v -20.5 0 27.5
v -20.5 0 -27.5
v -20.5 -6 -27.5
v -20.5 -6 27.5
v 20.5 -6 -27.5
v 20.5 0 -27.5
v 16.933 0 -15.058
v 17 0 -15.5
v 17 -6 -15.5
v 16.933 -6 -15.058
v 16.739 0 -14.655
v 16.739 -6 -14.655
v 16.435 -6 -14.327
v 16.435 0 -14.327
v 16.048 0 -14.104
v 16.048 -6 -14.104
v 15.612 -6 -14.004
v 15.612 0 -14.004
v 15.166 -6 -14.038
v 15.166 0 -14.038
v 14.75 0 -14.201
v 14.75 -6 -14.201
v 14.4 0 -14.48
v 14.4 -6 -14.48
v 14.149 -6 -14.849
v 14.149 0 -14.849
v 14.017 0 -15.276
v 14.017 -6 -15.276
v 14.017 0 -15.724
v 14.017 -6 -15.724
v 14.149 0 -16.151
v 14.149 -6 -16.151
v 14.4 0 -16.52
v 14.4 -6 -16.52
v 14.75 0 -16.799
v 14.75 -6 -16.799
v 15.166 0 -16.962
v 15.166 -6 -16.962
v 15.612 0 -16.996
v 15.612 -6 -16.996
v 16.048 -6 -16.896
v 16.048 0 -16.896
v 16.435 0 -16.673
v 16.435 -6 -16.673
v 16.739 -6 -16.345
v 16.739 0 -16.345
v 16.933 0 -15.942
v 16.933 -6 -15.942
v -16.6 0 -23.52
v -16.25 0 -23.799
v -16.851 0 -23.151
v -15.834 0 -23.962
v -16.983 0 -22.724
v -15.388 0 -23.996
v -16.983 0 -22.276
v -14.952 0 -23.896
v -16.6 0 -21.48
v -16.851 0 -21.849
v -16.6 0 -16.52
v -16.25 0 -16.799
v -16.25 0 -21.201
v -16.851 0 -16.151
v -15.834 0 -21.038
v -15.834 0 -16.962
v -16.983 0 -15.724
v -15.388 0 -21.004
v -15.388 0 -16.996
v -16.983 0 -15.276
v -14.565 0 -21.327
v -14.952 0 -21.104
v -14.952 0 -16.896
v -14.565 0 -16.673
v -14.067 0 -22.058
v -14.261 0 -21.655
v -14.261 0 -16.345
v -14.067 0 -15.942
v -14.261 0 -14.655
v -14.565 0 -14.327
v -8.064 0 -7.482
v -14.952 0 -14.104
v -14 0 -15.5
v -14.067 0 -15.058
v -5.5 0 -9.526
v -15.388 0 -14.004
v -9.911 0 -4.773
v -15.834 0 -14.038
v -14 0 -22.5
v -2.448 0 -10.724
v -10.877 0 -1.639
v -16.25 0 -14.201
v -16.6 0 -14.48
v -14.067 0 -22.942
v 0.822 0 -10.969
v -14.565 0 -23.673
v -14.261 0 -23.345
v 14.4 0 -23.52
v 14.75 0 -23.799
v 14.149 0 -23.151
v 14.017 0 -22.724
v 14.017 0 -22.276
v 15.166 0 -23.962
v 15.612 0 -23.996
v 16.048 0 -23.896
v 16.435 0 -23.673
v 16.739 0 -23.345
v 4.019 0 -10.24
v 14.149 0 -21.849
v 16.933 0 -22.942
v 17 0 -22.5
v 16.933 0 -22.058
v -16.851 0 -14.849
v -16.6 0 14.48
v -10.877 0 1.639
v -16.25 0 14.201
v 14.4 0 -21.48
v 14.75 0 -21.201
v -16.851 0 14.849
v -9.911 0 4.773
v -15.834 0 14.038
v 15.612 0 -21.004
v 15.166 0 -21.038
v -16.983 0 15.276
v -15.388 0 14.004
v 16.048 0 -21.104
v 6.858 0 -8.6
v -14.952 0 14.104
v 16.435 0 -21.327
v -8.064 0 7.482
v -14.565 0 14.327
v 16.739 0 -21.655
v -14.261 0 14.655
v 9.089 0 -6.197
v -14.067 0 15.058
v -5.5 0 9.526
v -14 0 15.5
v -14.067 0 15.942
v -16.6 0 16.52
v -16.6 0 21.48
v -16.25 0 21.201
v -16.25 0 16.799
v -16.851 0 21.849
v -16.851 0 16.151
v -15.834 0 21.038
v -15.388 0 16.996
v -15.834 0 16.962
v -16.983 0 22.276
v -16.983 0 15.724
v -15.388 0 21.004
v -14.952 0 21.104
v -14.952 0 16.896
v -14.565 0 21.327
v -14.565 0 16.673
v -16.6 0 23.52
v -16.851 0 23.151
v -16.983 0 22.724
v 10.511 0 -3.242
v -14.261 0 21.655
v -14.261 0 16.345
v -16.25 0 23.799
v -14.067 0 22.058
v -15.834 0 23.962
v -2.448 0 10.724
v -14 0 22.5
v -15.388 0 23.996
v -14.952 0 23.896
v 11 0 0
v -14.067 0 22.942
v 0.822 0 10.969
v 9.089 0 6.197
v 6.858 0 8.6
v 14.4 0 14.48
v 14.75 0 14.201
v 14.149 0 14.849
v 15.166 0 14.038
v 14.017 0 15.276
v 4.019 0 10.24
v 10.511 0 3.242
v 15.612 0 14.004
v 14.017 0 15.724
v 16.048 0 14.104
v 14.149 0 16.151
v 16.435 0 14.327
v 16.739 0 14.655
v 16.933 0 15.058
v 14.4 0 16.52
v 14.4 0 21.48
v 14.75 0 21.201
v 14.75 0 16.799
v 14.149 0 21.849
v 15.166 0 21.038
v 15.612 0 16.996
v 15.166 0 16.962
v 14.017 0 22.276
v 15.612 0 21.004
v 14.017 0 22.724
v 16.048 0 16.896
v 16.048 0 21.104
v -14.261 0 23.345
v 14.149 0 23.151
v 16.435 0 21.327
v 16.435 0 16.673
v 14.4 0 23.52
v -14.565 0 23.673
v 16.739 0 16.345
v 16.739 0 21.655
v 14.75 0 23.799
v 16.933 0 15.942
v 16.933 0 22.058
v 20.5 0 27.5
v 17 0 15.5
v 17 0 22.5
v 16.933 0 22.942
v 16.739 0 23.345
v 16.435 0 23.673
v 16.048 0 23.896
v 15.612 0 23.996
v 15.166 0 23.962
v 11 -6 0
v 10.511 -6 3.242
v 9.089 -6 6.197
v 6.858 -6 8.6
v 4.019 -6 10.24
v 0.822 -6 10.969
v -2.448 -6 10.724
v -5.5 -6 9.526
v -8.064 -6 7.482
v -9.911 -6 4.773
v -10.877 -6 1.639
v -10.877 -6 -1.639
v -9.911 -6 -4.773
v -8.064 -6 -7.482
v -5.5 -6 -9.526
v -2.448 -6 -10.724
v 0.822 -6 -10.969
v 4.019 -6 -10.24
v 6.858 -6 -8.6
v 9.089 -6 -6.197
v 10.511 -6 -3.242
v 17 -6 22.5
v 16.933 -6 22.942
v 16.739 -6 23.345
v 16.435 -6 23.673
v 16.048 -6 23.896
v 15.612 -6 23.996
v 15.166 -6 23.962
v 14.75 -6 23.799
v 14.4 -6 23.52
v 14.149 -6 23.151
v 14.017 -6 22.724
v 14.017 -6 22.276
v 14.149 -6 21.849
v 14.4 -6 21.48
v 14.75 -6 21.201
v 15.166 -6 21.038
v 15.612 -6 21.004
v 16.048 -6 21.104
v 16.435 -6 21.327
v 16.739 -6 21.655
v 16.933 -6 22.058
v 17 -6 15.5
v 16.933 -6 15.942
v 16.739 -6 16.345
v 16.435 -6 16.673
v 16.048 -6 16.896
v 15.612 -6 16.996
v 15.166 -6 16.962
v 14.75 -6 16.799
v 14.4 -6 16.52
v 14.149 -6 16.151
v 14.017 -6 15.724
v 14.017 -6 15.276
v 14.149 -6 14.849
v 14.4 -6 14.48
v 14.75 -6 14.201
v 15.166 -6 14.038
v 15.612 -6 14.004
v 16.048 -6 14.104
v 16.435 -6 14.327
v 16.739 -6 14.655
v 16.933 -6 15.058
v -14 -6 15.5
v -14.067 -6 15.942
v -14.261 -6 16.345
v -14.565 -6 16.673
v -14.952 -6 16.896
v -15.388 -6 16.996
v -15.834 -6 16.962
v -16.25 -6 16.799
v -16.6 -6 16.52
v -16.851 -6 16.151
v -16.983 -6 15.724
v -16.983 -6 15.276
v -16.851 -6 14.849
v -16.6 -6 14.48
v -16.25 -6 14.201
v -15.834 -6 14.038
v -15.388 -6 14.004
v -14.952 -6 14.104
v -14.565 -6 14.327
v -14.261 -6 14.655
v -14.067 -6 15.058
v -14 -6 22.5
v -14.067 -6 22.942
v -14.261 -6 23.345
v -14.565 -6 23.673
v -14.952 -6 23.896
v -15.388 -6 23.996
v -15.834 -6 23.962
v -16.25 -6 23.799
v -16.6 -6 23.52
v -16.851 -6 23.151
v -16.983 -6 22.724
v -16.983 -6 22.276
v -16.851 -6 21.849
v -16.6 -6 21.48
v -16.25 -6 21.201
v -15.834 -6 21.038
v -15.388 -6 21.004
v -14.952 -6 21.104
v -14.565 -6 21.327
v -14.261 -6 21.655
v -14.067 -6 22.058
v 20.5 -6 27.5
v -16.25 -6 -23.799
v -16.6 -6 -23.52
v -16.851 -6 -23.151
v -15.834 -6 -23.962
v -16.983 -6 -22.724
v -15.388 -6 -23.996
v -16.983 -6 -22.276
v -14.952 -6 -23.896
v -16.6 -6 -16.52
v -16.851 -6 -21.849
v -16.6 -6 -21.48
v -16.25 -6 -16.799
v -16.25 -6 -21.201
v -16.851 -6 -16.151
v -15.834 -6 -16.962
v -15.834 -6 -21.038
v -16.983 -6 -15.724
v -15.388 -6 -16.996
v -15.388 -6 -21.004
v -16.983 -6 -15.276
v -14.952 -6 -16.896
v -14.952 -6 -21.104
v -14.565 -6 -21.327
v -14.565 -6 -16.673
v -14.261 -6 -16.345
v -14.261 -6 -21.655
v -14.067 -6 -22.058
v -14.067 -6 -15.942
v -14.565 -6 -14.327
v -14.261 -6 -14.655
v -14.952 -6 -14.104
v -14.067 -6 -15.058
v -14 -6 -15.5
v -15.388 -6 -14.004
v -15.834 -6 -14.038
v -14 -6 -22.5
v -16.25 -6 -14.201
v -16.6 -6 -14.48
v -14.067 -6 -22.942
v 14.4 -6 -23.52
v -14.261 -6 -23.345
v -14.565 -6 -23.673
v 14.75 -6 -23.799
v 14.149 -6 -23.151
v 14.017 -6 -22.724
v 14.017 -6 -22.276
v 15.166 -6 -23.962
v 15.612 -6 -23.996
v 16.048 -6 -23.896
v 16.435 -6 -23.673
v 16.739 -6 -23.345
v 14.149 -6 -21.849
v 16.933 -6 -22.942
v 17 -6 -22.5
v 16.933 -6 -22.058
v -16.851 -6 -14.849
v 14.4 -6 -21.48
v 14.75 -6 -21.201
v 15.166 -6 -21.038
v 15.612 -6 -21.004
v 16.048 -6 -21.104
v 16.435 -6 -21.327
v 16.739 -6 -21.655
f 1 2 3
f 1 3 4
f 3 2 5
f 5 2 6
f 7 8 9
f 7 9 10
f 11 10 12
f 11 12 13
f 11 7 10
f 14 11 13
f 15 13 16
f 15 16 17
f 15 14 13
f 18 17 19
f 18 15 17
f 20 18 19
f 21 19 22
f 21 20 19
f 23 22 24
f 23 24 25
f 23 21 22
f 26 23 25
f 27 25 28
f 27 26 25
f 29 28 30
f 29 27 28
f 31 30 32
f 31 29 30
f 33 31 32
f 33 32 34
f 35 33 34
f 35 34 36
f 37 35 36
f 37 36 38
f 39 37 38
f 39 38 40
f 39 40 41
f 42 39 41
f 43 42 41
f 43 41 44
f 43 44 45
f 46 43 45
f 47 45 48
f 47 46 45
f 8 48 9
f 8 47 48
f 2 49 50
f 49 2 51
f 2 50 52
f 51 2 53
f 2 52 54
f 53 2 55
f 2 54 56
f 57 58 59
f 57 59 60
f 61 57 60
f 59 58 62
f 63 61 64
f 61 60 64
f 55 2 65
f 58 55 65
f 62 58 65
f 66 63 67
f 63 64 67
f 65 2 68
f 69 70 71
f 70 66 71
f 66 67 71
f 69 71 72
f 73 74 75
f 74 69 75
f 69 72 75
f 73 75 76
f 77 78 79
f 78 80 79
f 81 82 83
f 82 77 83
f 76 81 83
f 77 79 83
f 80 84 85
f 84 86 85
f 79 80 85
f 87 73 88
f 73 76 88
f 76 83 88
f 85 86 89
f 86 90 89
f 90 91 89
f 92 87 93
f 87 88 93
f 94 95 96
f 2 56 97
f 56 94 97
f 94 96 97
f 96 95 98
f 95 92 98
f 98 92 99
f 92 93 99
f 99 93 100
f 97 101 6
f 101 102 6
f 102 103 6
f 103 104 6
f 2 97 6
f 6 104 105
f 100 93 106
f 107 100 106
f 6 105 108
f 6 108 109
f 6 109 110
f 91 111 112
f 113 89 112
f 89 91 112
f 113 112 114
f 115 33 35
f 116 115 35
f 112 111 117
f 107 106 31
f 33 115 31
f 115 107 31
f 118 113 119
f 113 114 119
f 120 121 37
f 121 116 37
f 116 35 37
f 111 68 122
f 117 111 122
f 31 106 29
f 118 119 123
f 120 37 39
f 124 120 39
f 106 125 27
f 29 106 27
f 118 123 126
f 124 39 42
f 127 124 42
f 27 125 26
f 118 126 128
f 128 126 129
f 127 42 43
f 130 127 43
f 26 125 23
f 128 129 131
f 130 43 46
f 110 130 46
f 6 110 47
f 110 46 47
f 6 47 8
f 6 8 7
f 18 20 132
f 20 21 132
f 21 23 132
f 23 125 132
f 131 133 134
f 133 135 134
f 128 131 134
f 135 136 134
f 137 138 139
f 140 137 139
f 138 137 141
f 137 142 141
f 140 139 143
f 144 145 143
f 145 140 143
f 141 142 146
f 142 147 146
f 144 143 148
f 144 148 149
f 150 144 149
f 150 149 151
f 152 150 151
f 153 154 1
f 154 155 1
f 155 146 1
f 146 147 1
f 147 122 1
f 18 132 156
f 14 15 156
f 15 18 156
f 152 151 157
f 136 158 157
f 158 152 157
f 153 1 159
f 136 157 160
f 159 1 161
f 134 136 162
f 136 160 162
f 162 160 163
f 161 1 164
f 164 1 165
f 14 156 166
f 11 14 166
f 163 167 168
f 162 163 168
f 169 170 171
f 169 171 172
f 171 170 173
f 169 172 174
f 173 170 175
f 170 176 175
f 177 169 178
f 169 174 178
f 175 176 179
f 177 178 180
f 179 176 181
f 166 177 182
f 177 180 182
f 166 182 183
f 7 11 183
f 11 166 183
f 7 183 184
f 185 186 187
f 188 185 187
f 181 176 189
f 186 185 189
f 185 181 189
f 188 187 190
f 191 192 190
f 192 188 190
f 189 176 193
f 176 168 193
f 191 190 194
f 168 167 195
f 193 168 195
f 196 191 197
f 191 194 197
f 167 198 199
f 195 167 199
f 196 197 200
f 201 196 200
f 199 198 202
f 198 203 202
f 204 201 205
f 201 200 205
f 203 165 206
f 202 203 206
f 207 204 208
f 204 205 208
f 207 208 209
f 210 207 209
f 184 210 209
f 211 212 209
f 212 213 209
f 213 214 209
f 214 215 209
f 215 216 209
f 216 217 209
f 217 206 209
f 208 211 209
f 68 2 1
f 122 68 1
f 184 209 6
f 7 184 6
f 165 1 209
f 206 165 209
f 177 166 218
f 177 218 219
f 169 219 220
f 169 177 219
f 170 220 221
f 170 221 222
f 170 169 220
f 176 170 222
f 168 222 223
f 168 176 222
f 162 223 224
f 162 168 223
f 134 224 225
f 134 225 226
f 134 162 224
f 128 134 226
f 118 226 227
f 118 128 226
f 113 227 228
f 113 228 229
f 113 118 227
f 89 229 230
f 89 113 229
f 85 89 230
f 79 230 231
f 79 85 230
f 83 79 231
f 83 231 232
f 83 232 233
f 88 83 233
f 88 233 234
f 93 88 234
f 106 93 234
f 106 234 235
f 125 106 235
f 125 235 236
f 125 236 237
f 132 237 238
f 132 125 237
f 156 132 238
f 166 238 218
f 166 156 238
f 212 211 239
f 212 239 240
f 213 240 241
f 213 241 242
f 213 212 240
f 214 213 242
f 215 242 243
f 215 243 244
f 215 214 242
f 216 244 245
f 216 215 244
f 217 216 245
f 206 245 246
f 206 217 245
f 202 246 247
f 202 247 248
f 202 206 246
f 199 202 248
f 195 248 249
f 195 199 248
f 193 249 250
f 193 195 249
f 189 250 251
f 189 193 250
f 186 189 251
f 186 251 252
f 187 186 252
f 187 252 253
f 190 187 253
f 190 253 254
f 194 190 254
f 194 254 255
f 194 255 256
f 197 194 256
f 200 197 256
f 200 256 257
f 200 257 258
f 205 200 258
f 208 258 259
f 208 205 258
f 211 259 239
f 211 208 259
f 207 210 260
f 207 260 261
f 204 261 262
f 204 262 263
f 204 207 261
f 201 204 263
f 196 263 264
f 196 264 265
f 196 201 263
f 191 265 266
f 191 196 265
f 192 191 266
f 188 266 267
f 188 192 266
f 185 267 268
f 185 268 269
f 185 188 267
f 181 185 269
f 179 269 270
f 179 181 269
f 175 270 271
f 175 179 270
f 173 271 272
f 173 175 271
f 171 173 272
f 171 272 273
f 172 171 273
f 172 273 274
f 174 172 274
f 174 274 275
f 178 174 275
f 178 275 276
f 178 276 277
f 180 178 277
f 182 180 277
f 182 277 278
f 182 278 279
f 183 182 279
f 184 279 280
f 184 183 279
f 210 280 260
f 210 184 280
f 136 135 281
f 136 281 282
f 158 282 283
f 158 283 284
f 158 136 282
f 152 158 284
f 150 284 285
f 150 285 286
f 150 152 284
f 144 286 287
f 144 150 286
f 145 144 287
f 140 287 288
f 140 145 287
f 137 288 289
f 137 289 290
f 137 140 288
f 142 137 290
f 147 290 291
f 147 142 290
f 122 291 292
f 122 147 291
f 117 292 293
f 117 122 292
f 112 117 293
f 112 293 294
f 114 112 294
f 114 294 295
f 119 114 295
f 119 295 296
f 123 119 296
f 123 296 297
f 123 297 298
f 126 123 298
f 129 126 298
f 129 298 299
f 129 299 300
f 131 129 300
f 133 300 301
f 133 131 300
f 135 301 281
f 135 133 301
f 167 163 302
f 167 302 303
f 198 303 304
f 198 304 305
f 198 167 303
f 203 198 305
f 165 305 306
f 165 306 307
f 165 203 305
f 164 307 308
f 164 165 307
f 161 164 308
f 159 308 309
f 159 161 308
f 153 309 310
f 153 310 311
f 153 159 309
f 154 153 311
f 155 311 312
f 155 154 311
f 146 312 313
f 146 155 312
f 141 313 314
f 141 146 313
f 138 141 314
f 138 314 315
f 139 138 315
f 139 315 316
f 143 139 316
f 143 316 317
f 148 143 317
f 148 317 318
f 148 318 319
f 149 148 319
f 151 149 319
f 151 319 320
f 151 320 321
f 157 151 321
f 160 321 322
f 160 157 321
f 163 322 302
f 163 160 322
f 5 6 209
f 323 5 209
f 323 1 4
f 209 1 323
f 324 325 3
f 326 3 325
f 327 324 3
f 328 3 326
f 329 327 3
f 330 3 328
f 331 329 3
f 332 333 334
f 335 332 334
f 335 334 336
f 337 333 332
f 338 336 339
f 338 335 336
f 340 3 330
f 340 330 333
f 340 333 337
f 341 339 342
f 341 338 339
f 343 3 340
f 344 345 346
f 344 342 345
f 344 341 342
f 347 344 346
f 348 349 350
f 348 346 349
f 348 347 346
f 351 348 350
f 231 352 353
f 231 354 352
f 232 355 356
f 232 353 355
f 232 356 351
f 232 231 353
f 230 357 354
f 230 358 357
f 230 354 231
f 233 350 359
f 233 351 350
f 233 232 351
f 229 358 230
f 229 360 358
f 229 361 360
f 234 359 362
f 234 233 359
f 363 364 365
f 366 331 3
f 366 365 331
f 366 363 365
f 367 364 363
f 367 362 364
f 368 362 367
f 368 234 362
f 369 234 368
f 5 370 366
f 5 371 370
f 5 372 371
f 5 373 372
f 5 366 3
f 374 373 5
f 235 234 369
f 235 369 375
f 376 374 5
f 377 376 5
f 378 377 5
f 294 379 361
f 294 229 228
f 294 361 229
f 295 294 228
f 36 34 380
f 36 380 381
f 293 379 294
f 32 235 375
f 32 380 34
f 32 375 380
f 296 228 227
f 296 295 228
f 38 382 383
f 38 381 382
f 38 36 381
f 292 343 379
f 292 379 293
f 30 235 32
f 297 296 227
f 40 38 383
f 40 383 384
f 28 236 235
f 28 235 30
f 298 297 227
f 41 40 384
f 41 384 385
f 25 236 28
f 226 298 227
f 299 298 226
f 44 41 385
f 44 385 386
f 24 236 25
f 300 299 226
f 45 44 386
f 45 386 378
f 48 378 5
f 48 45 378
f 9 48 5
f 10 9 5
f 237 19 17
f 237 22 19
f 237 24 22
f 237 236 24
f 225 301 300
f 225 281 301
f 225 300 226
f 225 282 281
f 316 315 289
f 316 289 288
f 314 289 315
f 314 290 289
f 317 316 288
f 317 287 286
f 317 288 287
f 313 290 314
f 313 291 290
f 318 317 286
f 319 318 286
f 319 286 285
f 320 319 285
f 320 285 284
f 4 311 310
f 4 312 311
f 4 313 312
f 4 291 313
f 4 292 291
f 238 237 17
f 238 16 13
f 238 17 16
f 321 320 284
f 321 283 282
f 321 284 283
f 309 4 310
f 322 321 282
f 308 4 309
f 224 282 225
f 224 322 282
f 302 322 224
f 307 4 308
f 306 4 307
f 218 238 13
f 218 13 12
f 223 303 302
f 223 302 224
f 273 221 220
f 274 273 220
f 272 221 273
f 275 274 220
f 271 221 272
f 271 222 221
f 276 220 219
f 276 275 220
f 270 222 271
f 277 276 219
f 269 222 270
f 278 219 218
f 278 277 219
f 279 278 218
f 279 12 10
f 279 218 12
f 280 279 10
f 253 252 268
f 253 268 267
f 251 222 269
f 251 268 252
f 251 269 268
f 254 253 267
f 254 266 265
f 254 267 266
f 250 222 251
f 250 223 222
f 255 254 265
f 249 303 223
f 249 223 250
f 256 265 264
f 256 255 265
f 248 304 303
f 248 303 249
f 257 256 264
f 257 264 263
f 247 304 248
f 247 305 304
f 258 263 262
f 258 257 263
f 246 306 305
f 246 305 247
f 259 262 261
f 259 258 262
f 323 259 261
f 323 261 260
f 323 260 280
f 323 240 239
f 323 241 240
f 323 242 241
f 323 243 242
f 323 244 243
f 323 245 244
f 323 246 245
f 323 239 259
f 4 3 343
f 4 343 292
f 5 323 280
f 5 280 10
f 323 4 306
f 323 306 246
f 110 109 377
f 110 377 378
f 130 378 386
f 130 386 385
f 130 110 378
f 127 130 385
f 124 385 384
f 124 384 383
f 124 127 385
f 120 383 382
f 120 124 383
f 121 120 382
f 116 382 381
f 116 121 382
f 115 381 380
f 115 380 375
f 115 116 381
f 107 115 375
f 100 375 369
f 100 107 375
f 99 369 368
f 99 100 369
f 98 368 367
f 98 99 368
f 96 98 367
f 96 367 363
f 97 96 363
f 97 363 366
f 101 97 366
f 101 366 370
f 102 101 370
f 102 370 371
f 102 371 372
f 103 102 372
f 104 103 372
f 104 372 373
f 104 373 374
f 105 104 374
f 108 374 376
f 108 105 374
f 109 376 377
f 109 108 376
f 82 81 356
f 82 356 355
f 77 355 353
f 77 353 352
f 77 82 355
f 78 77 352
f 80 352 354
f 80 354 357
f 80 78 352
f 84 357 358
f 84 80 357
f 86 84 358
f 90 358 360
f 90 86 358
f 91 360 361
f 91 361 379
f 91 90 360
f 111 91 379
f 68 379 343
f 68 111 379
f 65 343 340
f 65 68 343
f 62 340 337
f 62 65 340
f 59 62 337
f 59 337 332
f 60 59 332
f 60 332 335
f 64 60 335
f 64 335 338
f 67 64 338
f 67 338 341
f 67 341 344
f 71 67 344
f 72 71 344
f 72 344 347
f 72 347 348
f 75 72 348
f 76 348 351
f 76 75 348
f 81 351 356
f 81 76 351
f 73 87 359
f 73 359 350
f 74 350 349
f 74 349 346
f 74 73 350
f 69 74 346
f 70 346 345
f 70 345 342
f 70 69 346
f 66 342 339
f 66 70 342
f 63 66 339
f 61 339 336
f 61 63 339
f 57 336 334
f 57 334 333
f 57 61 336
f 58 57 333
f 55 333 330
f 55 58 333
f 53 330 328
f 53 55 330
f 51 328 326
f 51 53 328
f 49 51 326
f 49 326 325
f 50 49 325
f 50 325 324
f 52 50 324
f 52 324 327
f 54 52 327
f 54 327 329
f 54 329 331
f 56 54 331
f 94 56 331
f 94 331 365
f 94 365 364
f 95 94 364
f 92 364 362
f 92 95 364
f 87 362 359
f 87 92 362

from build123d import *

# Parameters (mm, degrees)
F0_W     = 41
F0_H     = 55
F0_R     = 1.5
F0_R_2   = 11
F1_DEPTH = 6


with BuildPart() as f1:
    # F0 (on Front) → F1 (new body)
    with BuildSketch(Plane.XZ):
        Rectangle(F0_W, F0_H)
        with Locations((-15.5, -22.5)):
            Circle(F0_R, mode=Mode.SUBTRACT)
        with Locations((-15.5, -15.5)):
            Circle(F0_R, mode=Mode.SUBTRACT)
        with Locations((15.5, -22.5)):
            Circle(F0_R, mode=Mode.SUBTRACT)
        with Locations((15.5, -15.5)):
            Circle(F0_R, mode=Mode.SUBTRACT)
        with Locations((-15.5, 15.5)):
            Circle(F0_R, mode=Mode.SUBTRACT)
        with Locations((-15.5, 22.5)):
            Circle(F0_R, mode=Mode.SUBTRACT)
        Circle(F0_R_2, mode=Mode.SUBTRACT)
        with Locations((15.5, 15.5)):
            Circle(F0_R, mode=Mode.SUBTRACT)
        with Locations((15.5, 22.5)):
            Circle(F0_R, mode=Mode.SUBTRACT)
    extrude(amount=F1_DEPTH)


solid = f1.part
